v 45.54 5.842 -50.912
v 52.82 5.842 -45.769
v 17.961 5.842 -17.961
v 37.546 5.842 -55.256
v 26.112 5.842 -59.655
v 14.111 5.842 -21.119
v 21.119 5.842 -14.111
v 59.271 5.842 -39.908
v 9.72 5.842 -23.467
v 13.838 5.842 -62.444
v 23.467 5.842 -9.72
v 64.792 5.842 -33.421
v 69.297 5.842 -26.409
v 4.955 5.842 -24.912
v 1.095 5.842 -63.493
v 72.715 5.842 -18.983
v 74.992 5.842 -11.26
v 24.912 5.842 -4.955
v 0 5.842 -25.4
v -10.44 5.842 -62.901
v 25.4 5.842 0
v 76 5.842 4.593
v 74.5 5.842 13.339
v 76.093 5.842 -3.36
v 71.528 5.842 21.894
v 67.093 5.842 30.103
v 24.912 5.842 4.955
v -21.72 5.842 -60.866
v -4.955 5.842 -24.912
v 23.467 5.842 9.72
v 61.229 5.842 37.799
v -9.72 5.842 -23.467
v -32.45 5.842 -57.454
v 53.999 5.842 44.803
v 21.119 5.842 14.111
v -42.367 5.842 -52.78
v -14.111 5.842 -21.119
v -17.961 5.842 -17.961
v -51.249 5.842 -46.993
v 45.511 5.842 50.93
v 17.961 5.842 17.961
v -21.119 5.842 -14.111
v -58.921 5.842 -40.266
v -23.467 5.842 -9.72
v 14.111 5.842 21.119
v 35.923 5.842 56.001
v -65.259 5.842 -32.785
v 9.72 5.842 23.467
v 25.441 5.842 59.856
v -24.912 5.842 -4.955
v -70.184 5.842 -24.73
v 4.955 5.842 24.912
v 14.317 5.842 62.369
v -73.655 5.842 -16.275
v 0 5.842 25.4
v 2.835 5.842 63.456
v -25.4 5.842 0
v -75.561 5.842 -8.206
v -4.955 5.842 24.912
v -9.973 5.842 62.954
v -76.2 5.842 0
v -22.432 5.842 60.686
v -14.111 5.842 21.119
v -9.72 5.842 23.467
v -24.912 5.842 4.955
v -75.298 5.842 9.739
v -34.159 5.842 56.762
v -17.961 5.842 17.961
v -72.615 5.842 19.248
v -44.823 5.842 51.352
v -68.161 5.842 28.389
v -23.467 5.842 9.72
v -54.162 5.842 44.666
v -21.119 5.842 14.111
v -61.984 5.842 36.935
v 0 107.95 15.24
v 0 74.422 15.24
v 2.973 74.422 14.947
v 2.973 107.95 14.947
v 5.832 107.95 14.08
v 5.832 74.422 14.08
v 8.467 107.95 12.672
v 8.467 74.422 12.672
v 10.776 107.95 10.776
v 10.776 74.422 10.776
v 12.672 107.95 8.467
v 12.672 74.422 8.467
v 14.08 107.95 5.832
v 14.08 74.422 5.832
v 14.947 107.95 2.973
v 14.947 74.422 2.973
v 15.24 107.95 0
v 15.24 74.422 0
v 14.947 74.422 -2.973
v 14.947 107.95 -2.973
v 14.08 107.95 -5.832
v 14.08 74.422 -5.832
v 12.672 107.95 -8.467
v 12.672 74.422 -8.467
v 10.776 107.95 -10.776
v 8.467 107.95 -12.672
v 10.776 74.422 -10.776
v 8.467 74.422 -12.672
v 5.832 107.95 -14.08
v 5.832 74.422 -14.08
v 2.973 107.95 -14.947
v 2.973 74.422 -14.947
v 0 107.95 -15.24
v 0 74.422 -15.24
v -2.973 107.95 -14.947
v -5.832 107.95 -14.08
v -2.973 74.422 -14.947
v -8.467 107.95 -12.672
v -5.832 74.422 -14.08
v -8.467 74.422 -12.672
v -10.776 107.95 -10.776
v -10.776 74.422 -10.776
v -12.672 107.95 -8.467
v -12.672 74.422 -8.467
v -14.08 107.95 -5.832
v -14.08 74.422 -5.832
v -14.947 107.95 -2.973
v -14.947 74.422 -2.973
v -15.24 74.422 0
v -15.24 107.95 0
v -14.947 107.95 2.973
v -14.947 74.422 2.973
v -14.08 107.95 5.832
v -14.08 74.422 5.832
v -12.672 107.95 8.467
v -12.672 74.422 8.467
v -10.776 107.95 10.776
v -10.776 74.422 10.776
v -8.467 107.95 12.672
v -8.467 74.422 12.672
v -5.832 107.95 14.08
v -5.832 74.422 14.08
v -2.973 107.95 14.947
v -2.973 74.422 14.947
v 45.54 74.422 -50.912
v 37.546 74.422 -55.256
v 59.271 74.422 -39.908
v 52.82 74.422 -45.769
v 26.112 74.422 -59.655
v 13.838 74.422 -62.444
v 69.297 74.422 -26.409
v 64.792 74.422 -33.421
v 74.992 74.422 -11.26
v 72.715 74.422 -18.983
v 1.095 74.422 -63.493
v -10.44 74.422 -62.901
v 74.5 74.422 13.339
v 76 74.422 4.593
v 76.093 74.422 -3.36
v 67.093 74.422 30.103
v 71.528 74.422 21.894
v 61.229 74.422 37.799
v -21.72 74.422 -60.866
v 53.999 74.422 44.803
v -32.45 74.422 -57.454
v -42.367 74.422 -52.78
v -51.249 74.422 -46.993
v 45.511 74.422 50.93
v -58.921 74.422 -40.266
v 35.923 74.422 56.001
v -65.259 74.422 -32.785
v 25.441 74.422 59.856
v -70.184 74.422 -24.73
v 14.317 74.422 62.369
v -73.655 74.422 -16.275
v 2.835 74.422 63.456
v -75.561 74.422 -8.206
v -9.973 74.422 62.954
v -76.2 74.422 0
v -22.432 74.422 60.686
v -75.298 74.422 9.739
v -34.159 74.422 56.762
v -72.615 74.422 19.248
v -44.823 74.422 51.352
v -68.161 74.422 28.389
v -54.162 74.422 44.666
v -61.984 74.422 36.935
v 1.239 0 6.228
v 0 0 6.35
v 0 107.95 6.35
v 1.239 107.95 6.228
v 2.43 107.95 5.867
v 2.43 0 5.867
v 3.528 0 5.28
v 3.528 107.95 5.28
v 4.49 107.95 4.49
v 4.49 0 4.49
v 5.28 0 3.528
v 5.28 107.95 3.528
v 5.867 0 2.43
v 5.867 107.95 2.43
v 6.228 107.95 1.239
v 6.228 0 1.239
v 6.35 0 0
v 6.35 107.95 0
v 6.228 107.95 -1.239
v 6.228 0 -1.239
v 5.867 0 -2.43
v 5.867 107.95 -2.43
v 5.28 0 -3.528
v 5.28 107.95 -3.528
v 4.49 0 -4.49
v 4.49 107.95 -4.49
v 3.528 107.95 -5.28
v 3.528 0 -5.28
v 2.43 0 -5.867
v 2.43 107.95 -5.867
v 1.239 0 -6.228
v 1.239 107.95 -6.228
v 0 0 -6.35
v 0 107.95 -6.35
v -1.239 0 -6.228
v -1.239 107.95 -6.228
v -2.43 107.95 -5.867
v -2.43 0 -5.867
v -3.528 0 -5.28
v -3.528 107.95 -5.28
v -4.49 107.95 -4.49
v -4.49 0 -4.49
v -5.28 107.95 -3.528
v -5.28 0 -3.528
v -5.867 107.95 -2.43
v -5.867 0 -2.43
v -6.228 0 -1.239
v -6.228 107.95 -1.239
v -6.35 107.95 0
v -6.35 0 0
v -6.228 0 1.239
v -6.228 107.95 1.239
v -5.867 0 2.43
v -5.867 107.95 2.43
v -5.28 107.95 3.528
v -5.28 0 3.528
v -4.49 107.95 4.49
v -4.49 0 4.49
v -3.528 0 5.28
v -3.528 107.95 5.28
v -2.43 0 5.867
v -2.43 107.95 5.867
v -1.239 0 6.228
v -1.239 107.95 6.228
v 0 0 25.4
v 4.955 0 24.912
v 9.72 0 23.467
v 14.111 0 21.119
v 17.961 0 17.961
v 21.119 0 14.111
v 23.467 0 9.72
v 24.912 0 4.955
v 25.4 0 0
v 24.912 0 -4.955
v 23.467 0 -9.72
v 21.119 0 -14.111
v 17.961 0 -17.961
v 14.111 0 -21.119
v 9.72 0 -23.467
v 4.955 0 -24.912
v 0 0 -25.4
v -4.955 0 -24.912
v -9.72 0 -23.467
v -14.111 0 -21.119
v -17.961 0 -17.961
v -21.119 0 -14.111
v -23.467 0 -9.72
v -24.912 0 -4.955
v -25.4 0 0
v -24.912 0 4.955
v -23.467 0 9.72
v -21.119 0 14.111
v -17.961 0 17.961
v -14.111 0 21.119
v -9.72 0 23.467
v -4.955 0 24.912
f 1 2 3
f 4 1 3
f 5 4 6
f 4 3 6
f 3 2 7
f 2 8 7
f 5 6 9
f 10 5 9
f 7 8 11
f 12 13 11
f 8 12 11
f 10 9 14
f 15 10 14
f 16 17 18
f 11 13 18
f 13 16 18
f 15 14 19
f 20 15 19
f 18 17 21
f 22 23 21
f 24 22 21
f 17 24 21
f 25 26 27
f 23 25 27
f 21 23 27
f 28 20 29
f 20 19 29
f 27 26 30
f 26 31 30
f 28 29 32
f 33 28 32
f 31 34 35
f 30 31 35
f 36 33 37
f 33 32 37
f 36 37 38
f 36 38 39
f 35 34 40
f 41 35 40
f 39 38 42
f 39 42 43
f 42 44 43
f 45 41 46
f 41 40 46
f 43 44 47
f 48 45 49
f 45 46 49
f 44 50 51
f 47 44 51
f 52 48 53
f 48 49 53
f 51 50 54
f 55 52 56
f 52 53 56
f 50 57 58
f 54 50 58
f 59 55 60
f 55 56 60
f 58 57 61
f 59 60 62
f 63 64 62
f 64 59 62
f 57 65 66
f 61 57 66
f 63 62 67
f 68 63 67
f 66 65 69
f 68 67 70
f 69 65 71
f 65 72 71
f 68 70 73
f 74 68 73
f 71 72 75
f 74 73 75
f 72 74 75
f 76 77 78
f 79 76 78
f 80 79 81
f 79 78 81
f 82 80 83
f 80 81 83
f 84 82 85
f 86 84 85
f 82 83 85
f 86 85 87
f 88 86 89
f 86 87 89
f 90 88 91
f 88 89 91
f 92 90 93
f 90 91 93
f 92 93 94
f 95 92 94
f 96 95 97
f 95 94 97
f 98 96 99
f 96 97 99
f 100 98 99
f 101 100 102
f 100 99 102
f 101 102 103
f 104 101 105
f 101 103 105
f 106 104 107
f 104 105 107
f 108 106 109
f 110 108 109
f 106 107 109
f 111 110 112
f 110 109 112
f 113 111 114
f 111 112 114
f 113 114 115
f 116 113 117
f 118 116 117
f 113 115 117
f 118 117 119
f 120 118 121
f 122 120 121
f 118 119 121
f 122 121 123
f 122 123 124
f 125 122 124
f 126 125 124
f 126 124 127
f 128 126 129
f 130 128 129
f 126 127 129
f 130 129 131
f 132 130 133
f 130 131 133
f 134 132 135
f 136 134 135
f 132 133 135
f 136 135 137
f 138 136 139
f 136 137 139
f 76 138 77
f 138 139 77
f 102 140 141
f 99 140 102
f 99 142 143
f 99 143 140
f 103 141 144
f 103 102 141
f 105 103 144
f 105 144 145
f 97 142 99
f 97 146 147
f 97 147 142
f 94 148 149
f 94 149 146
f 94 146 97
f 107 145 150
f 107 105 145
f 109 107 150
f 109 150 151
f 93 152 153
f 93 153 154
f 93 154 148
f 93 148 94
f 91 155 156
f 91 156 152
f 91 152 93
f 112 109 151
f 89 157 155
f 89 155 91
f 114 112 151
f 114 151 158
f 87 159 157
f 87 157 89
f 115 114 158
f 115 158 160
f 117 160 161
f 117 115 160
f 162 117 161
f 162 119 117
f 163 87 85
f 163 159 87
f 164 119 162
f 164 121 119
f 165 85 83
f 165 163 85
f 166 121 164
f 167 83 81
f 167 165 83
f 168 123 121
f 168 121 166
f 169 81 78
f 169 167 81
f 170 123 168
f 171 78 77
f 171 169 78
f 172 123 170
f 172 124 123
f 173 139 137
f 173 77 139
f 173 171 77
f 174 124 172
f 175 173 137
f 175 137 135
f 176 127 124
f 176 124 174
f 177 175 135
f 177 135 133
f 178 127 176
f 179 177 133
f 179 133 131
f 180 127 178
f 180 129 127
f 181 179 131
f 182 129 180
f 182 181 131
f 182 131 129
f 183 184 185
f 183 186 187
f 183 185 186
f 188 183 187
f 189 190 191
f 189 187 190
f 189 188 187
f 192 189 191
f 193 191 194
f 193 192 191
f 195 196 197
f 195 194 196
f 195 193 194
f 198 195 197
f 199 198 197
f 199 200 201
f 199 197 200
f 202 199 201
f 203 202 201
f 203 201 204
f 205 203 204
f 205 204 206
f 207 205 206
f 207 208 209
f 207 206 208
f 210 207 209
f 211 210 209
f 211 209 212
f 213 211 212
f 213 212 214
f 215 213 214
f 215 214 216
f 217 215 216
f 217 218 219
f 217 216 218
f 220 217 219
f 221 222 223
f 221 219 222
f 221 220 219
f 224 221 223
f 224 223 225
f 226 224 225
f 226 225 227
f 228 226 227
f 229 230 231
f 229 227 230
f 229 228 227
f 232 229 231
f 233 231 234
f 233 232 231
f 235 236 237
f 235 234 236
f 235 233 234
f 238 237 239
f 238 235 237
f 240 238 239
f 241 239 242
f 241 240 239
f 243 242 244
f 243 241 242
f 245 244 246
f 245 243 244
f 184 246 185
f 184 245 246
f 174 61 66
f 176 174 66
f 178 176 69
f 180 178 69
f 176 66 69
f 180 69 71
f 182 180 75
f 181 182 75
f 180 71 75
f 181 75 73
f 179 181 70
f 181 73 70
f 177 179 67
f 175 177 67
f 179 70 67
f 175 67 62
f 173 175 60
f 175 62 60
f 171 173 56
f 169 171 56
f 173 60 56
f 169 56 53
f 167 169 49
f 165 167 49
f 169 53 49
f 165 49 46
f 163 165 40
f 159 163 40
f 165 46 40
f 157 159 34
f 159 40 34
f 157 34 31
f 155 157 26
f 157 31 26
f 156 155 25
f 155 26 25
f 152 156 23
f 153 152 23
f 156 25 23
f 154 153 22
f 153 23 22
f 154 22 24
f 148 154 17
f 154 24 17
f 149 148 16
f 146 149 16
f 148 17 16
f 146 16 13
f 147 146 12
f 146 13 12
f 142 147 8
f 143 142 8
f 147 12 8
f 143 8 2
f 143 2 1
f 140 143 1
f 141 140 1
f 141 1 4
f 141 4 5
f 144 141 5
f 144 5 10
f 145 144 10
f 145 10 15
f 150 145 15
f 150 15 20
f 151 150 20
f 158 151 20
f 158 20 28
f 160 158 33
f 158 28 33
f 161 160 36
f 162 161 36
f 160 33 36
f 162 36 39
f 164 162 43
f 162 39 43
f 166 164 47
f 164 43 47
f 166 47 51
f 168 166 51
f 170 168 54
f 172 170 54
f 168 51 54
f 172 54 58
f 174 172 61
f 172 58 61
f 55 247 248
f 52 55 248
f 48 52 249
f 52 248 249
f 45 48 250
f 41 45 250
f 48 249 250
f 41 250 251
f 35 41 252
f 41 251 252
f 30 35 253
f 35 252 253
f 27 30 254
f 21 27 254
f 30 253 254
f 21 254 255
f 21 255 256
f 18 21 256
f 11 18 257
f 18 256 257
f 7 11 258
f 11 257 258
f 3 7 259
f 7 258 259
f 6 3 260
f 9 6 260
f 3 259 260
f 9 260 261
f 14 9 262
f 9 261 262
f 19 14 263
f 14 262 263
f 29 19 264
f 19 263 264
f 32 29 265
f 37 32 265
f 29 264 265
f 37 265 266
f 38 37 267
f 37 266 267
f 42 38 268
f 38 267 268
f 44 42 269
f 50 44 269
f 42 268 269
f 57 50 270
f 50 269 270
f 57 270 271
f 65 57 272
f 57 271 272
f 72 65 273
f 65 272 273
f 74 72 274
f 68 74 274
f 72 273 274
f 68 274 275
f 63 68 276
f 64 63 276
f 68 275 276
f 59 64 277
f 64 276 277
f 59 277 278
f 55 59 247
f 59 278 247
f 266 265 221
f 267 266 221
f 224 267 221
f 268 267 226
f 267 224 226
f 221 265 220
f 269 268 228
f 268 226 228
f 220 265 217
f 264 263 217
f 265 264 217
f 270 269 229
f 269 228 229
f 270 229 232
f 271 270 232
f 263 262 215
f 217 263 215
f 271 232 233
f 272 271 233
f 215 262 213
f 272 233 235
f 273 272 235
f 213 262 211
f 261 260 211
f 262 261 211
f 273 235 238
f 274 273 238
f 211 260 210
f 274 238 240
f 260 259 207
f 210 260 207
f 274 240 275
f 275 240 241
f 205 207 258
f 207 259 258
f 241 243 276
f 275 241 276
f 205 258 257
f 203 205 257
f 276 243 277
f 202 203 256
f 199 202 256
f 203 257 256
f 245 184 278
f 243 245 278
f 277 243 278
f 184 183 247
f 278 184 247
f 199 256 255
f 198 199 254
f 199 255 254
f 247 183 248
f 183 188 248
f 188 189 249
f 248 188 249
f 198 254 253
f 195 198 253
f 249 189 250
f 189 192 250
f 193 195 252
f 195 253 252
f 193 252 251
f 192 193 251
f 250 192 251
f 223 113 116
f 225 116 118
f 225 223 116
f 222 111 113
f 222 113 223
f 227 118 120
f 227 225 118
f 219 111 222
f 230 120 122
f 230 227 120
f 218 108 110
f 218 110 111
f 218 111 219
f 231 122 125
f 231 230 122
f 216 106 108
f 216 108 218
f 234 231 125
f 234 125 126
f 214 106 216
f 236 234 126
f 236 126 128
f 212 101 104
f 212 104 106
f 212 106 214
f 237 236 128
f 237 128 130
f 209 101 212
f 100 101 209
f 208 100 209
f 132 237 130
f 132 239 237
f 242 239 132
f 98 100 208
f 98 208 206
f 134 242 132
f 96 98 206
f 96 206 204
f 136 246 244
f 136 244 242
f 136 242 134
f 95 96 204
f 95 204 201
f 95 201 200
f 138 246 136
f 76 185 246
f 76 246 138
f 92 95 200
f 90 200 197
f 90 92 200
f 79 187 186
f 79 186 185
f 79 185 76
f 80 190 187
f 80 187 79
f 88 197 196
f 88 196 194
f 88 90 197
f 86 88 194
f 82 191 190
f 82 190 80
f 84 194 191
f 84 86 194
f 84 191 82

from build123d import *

# Parameters (mm, degrees)
SKETCH1_R               = 25.4
BOSS_EXTRUDE1_DEPTH     = 5.842
SKETCH2_RX              = 76.2
SKETCH2_RY              = 63.5
BOSS_EXTRUDE2_DEPTH     = 68.58
SKETCH3_R               = 15.24
BOSS_EXTRUDE3_DEPTH     = 33.528
CUT_EXTRUDE2_DEPTH      = 147.601134034
CUT_EXTRUDE2_DEPTH_BACK = 147.601134034
SKETCH4_R               = 6.35


with BuildPart() as part:
    # Sketch1 → Boss-Extrude1 (new body)
    with BuildSketch(Plane(origin=(0, 0, 0), x_dir=(1, 0, 0), z_dir=(0, 1, 0))):
        with Locations(Location((0, 0, 0), (0, 0, 270))):
            Circle(SKETCH1_R)
    extrude(amount=BOSS_EXTRUDE1_DEPTH)

    # Sketch2 → Boss-Extrude2 (add)
    with BuildSketch(Plane(origin=(0, 5.842, 0), x_dir=(1, 0, 0), z_dir=(0, 1, 0))):
        with Locations(Location((0, 0), (0, 0, 180))):
            Ellipse(SKETCH2_RX, SKETCH2_RY)
    extrude(amount=BOSS_EXTRUDE2_DEPTH)

    # Sketch3 → Boss-Extrude3 (add)
    with BuildSketch(Plane(origin=(0, 74.422, 0), x_dir=(1, 0, 0), z_dir=(0, 1, 0))):
        with Locations(Location((0, 0, 0), (0, 0, 270))):
            Circle(SKETCH3_R)
    extrude(amount=BOSS_EXTRUDE3_DEPTH)

    # Sketch4 → Cut-Extrude2 (cut, two sides: drawn at the far end of the back side and taken through both)
    with BuildSketch(Plane(origin=(0, 0, 0), x_dir=(1, 0, 0), z_dir=(0, 1, 0)).offset(-CUT_EXTRUDE2_DEPTH_BACK)):
        with Locations(Location((0, 0, 0), (0, 0, 270))):
            Circle(SKETCH4_R)
    extrude(amount=CUT_EXTRUDE2_DEPTH + CUT_EXTRUDE2_DEPTH_BACK, mode=Mode.SUBTRACT)


solid = part.part
